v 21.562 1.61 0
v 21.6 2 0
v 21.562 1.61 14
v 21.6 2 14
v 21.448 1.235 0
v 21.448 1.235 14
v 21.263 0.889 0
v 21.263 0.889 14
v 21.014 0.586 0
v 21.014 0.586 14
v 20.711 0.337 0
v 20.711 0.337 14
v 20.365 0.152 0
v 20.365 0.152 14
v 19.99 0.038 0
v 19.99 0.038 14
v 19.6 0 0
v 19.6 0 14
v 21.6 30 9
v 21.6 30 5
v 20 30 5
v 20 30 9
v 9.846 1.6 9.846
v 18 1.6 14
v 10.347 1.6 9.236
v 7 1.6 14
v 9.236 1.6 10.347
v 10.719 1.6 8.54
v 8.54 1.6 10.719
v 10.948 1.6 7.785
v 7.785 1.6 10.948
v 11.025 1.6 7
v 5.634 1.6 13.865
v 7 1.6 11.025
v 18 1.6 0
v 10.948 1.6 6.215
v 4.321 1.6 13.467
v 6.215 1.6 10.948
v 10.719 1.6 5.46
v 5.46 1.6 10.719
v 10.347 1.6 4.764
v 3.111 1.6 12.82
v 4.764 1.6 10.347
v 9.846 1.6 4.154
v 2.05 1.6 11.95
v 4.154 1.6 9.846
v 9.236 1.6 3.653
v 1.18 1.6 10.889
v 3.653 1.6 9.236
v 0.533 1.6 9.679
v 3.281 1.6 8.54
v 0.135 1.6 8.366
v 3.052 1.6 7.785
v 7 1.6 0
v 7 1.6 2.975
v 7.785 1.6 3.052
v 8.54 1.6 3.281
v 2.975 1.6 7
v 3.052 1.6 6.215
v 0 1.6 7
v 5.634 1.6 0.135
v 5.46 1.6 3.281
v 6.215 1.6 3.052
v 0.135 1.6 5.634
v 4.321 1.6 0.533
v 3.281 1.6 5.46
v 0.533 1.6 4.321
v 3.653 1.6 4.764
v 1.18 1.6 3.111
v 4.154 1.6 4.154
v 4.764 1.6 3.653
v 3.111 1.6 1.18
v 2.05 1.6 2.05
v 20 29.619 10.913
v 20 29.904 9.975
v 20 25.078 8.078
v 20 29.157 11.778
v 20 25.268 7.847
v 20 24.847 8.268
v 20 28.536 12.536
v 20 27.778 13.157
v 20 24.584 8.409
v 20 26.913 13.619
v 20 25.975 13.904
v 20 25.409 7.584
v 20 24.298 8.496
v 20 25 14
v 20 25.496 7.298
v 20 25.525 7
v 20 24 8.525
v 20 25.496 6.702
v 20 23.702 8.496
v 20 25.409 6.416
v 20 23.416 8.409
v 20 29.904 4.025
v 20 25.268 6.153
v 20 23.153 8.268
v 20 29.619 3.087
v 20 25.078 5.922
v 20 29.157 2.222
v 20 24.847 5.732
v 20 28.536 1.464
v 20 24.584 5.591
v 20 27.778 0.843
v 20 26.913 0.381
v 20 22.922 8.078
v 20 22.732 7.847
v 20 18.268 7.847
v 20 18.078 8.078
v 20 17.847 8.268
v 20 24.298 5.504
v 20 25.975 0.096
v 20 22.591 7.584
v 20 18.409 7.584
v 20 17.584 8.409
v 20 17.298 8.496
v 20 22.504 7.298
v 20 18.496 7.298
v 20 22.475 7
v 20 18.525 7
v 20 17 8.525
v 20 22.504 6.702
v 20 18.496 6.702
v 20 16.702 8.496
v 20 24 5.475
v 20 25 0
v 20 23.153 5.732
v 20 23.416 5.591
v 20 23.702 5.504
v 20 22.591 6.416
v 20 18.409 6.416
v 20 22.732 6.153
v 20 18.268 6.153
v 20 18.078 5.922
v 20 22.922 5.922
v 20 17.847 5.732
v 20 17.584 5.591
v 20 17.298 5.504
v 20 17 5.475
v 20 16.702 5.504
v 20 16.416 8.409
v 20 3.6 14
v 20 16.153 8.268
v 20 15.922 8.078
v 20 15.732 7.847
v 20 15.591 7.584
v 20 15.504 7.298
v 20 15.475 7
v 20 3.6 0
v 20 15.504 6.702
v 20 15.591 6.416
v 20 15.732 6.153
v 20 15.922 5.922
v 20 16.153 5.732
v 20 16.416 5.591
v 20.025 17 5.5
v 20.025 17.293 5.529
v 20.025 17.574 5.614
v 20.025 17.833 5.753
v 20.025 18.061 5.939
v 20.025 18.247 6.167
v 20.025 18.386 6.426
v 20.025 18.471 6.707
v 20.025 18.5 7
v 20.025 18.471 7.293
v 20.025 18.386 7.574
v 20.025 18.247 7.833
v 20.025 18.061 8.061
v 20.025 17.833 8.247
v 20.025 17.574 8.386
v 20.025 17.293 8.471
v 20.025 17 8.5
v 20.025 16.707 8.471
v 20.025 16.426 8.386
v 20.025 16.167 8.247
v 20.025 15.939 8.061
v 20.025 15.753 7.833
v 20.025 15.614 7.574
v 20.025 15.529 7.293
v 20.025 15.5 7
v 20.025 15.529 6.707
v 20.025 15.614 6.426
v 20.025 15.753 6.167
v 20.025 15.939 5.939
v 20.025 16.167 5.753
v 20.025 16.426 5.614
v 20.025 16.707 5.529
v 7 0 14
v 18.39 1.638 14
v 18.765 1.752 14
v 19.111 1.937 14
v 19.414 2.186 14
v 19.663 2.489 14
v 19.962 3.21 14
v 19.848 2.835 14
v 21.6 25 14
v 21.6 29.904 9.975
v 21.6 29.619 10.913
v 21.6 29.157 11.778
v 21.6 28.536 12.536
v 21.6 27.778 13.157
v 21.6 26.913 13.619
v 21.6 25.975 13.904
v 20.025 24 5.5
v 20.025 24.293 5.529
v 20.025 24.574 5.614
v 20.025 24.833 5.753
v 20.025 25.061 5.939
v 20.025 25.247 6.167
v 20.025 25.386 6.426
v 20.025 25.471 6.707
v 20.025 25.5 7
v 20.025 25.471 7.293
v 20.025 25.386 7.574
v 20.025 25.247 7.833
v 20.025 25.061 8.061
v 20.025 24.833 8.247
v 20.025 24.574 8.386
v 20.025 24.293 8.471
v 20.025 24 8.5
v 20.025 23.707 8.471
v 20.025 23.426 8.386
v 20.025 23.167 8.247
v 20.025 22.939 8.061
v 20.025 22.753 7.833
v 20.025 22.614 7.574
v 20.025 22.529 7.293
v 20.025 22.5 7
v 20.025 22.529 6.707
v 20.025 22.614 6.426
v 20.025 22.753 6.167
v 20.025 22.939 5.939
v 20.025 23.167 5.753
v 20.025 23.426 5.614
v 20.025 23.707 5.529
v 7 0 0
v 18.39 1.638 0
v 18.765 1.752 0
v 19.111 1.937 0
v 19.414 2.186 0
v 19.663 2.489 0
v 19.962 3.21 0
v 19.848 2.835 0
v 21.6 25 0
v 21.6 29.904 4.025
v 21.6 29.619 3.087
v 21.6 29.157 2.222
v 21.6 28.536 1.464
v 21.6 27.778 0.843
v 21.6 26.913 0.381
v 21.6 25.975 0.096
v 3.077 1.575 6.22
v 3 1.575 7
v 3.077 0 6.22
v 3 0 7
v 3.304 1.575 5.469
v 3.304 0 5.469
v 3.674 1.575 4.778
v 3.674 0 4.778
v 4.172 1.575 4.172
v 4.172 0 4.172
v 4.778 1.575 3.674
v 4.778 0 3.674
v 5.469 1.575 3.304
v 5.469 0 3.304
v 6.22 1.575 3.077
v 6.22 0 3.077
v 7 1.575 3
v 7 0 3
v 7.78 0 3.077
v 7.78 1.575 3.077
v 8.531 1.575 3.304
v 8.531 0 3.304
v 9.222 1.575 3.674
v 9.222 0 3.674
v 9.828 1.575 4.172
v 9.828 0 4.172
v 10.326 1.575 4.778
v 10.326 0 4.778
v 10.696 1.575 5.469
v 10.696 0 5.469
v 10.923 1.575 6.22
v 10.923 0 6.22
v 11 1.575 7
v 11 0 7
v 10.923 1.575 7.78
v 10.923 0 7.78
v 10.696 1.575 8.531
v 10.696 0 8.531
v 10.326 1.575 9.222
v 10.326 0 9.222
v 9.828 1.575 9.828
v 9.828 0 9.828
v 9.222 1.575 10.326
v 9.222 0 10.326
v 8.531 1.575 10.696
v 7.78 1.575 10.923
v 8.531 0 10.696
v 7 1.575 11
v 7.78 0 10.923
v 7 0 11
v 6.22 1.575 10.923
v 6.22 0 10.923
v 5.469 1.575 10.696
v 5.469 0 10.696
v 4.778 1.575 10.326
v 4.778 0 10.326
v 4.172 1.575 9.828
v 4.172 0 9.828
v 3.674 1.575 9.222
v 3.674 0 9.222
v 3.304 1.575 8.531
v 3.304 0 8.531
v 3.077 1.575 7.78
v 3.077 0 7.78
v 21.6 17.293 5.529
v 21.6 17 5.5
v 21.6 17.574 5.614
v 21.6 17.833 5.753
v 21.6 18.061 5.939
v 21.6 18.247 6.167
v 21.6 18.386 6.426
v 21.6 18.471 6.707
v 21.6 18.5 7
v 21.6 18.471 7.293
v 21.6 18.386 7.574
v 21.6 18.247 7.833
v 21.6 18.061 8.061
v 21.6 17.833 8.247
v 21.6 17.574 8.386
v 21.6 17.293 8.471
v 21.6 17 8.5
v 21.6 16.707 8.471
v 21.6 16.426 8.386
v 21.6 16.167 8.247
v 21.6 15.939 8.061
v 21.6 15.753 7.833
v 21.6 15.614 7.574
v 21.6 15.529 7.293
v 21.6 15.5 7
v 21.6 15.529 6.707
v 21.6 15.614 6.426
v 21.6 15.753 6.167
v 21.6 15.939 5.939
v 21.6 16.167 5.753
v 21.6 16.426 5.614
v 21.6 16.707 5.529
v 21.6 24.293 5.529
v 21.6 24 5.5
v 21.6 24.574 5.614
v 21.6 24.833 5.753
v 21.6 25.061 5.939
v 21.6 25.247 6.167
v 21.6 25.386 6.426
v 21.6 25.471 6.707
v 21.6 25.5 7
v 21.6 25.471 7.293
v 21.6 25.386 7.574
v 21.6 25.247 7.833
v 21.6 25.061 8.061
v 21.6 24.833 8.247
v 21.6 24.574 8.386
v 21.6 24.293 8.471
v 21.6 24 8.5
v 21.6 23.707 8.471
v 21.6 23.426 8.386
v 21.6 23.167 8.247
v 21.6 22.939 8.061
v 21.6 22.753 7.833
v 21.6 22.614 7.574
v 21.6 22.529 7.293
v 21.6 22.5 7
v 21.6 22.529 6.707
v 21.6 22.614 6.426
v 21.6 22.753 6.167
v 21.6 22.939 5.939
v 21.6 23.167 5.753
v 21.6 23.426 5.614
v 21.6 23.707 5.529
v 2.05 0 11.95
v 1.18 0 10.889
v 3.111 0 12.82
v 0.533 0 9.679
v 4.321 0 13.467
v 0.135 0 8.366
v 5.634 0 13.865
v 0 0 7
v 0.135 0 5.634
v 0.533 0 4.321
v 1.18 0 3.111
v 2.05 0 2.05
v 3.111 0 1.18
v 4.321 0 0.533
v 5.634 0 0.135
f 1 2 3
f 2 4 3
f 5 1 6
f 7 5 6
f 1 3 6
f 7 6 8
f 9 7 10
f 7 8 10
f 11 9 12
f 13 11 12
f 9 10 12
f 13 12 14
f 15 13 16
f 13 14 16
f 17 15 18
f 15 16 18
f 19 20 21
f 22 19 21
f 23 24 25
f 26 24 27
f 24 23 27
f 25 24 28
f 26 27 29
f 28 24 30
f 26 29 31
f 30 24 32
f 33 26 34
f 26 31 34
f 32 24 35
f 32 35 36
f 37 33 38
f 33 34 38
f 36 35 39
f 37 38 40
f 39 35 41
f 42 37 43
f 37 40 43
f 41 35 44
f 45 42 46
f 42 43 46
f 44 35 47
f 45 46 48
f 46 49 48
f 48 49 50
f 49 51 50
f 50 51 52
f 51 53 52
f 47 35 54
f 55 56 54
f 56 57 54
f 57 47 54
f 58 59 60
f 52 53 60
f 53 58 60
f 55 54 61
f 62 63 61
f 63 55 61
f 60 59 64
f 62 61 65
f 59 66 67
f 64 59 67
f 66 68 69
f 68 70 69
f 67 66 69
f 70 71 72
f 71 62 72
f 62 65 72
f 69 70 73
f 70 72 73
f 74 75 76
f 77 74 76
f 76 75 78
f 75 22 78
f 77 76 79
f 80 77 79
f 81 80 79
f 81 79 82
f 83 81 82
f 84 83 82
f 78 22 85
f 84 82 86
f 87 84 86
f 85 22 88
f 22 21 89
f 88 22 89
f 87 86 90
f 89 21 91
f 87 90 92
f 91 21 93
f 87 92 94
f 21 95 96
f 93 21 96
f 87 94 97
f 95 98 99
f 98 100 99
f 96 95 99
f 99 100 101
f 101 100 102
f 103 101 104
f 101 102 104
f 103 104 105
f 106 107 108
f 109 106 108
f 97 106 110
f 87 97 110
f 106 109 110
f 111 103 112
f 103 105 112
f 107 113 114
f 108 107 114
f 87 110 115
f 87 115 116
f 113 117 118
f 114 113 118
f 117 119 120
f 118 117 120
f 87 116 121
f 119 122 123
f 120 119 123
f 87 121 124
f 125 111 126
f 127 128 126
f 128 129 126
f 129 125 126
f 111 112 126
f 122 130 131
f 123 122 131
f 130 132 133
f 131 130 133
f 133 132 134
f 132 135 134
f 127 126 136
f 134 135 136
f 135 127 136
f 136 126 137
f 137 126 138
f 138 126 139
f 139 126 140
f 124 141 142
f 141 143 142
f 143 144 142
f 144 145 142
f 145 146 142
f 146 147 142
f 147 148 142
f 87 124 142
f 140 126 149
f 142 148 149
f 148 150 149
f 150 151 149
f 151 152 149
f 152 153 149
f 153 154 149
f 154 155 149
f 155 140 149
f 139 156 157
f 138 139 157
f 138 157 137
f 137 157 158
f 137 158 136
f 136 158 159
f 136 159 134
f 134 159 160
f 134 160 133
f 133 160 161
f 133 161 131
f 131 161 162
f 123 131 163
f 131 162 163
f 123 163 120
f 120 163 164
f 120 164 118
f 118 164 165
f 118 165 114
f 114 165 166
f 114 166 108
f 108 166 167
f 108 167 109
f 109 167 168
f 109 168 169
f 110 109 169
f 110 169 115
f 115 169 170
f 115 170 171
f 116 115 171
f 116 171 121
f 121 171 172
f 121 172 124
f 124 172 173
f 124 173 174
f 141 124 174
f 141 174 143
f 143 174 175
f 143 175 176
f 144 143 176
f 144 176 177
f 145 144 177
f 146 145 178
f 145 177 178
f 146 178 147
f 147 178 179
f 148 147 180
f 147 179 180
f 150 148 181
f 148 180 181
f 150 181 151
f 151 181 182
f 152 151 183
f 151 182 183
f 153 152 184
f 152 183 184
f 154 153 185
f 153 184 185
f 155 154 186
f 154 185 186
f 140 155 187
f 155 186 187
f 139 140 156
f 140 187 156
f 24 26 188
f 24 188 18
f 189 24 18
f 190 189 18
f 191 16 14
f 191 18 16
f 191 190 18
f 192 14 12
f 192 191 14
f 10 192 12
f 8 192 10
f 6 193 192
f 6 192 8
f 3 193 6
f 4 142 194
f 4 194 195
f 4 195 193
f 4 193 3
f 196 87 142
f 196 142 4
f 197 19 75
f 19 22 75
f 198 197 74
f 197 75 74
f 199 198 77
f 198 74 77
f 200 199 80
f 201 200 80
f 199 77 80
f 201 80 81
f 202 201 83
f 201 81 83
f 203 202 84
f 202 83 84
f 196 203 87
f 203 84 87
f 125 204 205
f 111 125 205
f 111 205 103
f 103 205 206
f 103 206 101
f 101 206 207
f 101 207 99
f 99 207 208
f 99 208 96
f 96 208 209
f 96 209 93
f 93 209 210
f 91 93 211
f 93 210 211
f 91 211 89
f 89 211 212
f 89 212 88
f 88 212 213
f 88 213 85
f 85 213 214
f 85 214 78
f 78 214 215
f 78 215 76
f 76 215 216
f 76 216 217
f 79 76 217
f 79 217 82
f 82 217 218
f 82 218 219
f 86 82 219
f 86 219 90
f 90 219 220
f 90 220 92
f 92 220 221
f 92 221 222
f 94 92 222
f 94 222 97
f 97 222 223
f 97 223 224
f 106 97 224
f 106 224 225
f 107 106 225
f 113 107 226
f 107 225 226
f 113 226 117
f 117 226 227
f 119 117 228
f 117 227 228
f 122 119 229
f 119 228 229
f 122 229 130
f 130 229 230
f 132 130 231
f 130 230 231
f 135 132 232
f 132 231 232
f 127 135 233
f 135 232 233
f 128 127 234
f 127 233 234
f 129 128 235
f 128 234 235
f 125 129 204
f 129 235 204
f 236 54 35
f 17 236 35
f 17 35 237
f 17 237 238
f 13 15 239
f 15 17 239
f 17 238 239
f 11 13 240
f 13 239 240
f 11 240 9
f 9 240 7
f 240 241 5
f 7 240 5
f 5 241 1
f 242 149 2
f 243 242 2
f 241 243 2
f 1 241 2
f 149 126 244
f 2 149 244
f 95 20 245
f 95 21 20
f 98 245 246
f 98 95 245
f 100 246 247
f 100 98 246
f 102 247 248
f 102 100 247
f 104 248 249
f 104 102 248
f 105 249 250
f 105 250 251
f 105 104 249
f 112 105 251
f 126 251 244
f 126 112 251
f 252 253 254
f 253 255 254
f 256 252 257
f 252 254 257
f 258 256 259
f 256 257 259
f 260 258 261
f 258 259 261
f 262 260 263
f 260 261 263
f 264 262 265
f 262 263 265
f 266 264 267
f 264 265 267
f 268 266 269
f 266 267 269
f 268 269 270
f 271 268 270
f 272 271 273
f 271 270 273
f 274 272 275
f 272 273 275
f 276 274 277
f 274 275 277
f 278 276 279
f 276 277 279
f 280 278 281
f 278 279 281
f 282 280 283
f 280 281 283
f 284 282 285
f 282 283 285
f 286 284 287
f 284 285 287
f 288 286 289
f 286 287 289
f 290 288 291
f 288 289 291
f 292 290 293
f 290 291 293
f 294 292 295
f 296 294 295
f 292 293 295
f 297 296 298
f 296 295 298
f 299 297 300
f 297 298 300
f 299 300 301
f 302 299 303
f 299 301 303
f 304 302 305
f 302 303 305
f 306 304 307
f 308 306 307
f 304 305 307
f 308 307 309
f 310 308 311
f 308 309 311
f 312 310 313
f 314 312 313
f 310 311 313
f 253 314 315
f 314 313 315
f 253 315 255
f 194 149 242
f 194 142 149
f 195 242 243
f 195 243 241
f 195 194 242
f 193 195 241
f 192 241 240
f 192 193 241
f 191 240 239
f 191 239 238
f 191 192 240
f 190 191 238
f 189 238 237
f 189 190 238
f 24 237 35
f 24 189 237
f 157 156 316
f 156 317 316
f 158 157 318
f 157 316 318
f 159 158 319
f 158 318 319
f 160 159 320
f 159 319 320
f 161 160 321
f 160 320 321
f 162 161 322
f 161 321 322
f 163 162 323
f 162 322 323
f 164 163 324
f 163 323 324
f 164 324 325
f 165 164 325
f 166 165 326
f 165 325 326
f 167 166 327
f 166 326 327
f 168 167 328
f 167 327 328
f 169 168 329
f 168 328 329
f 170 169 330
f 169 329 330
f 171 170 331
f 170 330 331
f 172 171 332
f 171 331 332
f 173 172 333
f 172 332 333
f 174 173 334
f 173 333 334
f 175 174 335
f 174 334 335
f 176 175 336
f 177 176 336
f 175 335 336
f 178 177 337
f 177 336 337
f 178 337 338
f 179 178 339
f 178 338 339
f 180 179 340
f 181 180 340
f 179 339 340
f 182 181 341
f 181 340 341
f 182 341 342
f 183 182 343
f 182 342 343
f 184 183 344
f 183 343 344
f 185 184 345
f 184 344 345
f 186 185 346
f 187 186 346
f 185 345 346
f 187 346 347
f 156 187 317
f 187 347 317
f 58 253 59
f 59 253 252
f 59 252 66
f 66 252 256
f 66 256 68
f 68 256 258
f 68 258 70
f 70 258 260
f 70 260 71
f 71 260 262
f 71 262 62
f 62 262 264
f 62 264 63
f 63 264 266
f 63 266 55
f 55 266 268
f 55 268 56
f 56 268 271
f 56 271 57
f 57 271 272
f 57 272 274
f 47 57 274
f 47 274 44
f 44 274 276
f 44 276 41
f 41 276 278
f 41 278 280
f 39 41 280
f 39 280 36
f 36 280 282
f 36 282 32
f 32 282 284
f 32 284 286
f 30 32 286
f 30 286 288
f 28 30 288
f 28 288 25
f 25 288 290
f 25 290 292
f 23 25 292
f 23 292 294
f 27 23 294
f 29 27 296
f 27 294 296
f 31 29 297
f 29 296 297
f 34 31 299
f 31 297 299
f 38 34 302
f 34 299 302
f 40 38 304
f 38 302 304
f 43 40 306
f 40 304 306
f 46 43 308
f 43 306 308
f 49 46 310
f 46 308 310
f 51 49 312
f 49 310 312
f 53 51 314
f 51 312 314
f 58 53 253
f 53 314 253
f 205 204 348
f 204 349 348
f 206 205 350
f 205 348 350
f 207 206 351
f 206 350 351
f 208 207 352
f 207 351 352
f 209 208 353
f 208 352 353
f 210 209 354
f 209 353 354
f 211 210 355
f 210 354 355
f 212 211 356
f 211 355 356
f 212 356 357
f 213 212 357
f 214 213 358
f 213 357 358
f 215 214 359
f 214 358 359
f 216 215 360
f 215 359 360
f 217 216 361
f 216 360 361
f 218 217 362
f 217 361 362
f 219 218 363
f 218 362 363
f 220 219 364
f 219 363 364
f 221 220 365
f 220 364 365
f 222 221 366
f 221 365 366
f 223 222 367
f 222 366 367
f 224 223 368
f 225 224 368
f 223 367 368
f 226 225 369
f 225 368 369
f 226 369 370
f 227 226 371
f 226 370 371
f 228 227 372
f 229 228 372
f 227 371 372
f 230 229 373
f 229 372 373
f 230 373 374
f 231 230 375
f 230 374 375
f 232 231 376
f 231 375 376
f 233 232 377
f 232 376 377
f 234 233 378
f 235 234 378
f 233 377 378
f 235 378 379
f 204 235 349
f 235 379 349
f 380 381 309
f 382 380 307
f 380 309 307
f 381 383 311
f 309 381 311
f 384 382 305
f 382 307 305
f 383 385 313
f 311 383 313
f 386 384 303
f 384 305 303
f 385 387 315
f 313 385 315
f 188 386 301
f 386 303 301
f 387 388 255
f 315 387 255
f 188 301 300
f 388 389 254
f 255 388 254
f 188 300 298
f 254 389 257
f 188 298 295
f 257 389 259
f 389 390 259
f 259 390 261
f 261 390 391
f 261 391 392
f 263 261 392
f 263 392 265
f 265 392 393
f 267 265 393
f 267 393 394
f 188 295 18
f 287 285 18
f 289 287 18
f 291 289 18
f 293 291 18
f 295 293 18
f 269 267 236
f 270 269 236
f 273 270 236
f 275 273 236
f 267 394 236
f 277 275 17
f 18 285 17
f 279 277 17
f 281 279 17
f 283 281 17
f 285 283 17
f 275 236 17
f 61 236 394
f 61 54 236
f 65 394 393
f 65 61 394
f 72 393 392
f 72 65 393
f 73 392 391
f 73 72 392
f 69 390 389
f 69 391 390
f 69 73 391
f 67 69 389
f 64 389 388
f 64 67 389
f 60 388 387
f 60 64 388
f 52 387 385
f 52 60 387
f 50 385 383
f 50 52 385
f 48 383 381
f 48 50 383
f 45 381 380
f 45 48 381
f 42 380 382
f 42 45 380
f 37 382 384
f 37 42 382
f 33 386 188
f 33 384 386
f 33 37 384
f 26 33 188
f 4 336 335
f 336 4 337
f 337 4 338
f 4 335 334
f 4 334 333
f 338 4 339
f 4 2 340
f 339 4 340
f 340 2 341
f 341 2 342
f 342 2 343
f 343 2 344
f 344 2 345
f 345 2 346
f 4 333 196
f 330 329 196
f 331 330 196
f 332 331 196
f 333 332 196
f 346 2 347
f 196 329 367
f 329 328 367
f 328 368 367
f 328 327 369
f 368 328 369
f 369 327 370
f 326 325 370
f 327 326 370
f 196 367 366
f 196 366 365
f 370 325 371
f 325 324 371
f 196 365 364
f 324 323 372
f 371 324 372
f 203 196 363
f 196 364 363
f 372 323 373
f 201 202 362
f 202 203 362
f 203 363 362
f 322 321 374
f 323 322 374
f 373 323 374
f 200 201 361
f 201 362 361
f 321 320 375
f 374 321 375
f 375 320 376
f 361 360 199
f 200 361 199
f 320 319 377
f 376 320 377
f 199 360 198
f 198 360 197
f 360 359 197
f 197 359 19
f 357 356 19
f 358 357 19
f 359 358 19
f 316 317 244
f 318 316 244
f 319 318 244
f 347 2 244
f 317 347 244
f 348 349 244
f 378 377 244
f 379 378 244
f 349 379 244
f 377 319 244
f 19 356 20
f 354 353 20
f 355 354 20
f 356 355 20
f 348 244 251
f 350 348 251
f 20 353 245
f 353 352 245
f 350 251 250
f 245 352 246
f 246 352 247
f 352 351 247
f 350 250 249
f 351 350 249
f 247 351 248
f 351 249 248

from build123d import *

# Parameters (mm, degrees)
BOSS_EXTRUDE1_DEPTH             = 14
FILLET1_RADIUS                  = 7
FILLET1_LENGTH                  = 1.6
F_8_0MM_DOWEL_HOLE2_D           = 8
F_8_0MM_DOWEL_HOLE2_DEPTH       = 30
F_8_0MM_DOWEL_HOLE2_CSINK_D     = 8.05
F_8_0MM_DOWEL_HOLE2_CSINK_ANGLE = 90
F_8_0MM_DOWEL_HOLE2_TIP         = 2.403442476
F_3_0MM_DOWEL_HOLE1_D           = 3
F_3_0MM_DOWEL_HOLE1_DEPTH       = 30
F_3_0MM_DOWEL_HOLE1_CSINK_D     = 3.05
F_3_0MM_DOWEL_HOLE1_CSINK_ANGLE = 90
F_3_0MM_DOWEL_HOLE1_TIP         = 0.901290929
FILLET2_R                       = 5
FILLET3_R                       = 2


with BuildPart() as part:
    # Sketch1 → Boss-Extrude1 (new body)
    with BuildSketch(Plane.XY):
        Polygon((0, 0), (21.6, 0), (21.6, 30), (20, 30), (20, 1.6), (0, 1.6), align=None)
    extrude(amount=BOSS_EXTRUDE1_DEPTH)

    # Fillet1: full round fillet: the end face becomes a half cylinder, R = half its width
    fillet1_face = Plane((0, 0.8, 7), x_dir=(0, 1, 0), z_dir=(-1, 0, 0))  # on the end face: x along it, z out of the body
    fillet1_slab = fillet1_face.offset(-FILLET1_RADIUS / 2) * Box(FILLET1_LENGTH, 2 * FILLET1_RADIUS, FILLET1_RADIUS, mode=Mode.PRIVATE)  # the body's end, R deep
    fillet1_round = Plane((7, 0.8, 7), x_dir=(-1, 0, 0), z_dir=(0, 1, 0)) * Cylinder(FILLET1_RADIUS, FILLET1_LENGTH, mode=Mode.PRIVATE)  # its axis R under the face
    add(fillet1_slab - fillet1_round, mode=Mode.SUBTRACT)

    # Ø8.0mm Dowel Hole2
    with Locations(Plane(origin=(0, 1.6, 0), x_dir=(1, 0, 0), z_dir=(0, 1, 0))):
        with Locations((7, -7)):
            CounterSinkHole(F_8_0MM_DOWEL_HOLE2_D / 2, F_8_0MM_DOWEL_HOLE2_CSINK_D / 2, depth=F_8_0MM_DOWEL_HOLE2_DEPTH, counter_sink_angle=F_8_0MM_DOWEL_HOLE2_CSINK_ANGLE)
            with Locations((0, 0, -(F_8_0MM_DOWEL_HOLE2_DEPTH + F_8_0MM_DOWEL_HOLE2_TIP / 2))):  # 118° drill point
                Cone(0, F_8_0MM_DOWEL_HOLE2_D / 2, F_8_0MM_DOWEL_HOLE2_TIP, mode=Mode.SUBTRACT)

    # Ø3.0mm Dowel Hole1
    with Locations(Plane.ZY.offset(-20)):
        with Locations((7, 24), (7, 17)):
            CounterSinkHole(F_3_0MM_DOWEL_HOLE1_D / 2, F_3_0MM_DOWEL_HOLE1_CSINK_D / 2, depth=F_3_0MM_DOWEL_HOLE1_DEPTH, counter_sink_angle=F_3_0MM_DOWEL_HOLE1_CSINK_ANGLE)
            with Locations((0, 0, -(F_3_0MM_DOWEL_HOLE1_DEPTH + F_3_0MM_DOWEL_HOLE1_TIP / 2))):  # 118° drill point
                Cone(0, F_3_0MM_DOWEL_HOLE1_D / 2, F_3_0MM_DOWEL_HOLE1_TIP, mode=Mode.SUBTRACT)

    # Fillet2
    fillet2_edges = [part.edges().sort_by_distance(p)[0] for p in [
        (20.8, 30, 14),
        (20.8, 30, 0),
    ]]
    fillet(fillet2_edges, radius=FILLET2_R)

    # Fillet3
    fillet3_edges = [part.edges().sort_by_distance(p)[0] for p in [
        (20, 1.6, 7),
        (21.6, 0, 7),
    ]]
    fillet(fillet3_edges, radius=FILLET3_R)


solid = part.part
